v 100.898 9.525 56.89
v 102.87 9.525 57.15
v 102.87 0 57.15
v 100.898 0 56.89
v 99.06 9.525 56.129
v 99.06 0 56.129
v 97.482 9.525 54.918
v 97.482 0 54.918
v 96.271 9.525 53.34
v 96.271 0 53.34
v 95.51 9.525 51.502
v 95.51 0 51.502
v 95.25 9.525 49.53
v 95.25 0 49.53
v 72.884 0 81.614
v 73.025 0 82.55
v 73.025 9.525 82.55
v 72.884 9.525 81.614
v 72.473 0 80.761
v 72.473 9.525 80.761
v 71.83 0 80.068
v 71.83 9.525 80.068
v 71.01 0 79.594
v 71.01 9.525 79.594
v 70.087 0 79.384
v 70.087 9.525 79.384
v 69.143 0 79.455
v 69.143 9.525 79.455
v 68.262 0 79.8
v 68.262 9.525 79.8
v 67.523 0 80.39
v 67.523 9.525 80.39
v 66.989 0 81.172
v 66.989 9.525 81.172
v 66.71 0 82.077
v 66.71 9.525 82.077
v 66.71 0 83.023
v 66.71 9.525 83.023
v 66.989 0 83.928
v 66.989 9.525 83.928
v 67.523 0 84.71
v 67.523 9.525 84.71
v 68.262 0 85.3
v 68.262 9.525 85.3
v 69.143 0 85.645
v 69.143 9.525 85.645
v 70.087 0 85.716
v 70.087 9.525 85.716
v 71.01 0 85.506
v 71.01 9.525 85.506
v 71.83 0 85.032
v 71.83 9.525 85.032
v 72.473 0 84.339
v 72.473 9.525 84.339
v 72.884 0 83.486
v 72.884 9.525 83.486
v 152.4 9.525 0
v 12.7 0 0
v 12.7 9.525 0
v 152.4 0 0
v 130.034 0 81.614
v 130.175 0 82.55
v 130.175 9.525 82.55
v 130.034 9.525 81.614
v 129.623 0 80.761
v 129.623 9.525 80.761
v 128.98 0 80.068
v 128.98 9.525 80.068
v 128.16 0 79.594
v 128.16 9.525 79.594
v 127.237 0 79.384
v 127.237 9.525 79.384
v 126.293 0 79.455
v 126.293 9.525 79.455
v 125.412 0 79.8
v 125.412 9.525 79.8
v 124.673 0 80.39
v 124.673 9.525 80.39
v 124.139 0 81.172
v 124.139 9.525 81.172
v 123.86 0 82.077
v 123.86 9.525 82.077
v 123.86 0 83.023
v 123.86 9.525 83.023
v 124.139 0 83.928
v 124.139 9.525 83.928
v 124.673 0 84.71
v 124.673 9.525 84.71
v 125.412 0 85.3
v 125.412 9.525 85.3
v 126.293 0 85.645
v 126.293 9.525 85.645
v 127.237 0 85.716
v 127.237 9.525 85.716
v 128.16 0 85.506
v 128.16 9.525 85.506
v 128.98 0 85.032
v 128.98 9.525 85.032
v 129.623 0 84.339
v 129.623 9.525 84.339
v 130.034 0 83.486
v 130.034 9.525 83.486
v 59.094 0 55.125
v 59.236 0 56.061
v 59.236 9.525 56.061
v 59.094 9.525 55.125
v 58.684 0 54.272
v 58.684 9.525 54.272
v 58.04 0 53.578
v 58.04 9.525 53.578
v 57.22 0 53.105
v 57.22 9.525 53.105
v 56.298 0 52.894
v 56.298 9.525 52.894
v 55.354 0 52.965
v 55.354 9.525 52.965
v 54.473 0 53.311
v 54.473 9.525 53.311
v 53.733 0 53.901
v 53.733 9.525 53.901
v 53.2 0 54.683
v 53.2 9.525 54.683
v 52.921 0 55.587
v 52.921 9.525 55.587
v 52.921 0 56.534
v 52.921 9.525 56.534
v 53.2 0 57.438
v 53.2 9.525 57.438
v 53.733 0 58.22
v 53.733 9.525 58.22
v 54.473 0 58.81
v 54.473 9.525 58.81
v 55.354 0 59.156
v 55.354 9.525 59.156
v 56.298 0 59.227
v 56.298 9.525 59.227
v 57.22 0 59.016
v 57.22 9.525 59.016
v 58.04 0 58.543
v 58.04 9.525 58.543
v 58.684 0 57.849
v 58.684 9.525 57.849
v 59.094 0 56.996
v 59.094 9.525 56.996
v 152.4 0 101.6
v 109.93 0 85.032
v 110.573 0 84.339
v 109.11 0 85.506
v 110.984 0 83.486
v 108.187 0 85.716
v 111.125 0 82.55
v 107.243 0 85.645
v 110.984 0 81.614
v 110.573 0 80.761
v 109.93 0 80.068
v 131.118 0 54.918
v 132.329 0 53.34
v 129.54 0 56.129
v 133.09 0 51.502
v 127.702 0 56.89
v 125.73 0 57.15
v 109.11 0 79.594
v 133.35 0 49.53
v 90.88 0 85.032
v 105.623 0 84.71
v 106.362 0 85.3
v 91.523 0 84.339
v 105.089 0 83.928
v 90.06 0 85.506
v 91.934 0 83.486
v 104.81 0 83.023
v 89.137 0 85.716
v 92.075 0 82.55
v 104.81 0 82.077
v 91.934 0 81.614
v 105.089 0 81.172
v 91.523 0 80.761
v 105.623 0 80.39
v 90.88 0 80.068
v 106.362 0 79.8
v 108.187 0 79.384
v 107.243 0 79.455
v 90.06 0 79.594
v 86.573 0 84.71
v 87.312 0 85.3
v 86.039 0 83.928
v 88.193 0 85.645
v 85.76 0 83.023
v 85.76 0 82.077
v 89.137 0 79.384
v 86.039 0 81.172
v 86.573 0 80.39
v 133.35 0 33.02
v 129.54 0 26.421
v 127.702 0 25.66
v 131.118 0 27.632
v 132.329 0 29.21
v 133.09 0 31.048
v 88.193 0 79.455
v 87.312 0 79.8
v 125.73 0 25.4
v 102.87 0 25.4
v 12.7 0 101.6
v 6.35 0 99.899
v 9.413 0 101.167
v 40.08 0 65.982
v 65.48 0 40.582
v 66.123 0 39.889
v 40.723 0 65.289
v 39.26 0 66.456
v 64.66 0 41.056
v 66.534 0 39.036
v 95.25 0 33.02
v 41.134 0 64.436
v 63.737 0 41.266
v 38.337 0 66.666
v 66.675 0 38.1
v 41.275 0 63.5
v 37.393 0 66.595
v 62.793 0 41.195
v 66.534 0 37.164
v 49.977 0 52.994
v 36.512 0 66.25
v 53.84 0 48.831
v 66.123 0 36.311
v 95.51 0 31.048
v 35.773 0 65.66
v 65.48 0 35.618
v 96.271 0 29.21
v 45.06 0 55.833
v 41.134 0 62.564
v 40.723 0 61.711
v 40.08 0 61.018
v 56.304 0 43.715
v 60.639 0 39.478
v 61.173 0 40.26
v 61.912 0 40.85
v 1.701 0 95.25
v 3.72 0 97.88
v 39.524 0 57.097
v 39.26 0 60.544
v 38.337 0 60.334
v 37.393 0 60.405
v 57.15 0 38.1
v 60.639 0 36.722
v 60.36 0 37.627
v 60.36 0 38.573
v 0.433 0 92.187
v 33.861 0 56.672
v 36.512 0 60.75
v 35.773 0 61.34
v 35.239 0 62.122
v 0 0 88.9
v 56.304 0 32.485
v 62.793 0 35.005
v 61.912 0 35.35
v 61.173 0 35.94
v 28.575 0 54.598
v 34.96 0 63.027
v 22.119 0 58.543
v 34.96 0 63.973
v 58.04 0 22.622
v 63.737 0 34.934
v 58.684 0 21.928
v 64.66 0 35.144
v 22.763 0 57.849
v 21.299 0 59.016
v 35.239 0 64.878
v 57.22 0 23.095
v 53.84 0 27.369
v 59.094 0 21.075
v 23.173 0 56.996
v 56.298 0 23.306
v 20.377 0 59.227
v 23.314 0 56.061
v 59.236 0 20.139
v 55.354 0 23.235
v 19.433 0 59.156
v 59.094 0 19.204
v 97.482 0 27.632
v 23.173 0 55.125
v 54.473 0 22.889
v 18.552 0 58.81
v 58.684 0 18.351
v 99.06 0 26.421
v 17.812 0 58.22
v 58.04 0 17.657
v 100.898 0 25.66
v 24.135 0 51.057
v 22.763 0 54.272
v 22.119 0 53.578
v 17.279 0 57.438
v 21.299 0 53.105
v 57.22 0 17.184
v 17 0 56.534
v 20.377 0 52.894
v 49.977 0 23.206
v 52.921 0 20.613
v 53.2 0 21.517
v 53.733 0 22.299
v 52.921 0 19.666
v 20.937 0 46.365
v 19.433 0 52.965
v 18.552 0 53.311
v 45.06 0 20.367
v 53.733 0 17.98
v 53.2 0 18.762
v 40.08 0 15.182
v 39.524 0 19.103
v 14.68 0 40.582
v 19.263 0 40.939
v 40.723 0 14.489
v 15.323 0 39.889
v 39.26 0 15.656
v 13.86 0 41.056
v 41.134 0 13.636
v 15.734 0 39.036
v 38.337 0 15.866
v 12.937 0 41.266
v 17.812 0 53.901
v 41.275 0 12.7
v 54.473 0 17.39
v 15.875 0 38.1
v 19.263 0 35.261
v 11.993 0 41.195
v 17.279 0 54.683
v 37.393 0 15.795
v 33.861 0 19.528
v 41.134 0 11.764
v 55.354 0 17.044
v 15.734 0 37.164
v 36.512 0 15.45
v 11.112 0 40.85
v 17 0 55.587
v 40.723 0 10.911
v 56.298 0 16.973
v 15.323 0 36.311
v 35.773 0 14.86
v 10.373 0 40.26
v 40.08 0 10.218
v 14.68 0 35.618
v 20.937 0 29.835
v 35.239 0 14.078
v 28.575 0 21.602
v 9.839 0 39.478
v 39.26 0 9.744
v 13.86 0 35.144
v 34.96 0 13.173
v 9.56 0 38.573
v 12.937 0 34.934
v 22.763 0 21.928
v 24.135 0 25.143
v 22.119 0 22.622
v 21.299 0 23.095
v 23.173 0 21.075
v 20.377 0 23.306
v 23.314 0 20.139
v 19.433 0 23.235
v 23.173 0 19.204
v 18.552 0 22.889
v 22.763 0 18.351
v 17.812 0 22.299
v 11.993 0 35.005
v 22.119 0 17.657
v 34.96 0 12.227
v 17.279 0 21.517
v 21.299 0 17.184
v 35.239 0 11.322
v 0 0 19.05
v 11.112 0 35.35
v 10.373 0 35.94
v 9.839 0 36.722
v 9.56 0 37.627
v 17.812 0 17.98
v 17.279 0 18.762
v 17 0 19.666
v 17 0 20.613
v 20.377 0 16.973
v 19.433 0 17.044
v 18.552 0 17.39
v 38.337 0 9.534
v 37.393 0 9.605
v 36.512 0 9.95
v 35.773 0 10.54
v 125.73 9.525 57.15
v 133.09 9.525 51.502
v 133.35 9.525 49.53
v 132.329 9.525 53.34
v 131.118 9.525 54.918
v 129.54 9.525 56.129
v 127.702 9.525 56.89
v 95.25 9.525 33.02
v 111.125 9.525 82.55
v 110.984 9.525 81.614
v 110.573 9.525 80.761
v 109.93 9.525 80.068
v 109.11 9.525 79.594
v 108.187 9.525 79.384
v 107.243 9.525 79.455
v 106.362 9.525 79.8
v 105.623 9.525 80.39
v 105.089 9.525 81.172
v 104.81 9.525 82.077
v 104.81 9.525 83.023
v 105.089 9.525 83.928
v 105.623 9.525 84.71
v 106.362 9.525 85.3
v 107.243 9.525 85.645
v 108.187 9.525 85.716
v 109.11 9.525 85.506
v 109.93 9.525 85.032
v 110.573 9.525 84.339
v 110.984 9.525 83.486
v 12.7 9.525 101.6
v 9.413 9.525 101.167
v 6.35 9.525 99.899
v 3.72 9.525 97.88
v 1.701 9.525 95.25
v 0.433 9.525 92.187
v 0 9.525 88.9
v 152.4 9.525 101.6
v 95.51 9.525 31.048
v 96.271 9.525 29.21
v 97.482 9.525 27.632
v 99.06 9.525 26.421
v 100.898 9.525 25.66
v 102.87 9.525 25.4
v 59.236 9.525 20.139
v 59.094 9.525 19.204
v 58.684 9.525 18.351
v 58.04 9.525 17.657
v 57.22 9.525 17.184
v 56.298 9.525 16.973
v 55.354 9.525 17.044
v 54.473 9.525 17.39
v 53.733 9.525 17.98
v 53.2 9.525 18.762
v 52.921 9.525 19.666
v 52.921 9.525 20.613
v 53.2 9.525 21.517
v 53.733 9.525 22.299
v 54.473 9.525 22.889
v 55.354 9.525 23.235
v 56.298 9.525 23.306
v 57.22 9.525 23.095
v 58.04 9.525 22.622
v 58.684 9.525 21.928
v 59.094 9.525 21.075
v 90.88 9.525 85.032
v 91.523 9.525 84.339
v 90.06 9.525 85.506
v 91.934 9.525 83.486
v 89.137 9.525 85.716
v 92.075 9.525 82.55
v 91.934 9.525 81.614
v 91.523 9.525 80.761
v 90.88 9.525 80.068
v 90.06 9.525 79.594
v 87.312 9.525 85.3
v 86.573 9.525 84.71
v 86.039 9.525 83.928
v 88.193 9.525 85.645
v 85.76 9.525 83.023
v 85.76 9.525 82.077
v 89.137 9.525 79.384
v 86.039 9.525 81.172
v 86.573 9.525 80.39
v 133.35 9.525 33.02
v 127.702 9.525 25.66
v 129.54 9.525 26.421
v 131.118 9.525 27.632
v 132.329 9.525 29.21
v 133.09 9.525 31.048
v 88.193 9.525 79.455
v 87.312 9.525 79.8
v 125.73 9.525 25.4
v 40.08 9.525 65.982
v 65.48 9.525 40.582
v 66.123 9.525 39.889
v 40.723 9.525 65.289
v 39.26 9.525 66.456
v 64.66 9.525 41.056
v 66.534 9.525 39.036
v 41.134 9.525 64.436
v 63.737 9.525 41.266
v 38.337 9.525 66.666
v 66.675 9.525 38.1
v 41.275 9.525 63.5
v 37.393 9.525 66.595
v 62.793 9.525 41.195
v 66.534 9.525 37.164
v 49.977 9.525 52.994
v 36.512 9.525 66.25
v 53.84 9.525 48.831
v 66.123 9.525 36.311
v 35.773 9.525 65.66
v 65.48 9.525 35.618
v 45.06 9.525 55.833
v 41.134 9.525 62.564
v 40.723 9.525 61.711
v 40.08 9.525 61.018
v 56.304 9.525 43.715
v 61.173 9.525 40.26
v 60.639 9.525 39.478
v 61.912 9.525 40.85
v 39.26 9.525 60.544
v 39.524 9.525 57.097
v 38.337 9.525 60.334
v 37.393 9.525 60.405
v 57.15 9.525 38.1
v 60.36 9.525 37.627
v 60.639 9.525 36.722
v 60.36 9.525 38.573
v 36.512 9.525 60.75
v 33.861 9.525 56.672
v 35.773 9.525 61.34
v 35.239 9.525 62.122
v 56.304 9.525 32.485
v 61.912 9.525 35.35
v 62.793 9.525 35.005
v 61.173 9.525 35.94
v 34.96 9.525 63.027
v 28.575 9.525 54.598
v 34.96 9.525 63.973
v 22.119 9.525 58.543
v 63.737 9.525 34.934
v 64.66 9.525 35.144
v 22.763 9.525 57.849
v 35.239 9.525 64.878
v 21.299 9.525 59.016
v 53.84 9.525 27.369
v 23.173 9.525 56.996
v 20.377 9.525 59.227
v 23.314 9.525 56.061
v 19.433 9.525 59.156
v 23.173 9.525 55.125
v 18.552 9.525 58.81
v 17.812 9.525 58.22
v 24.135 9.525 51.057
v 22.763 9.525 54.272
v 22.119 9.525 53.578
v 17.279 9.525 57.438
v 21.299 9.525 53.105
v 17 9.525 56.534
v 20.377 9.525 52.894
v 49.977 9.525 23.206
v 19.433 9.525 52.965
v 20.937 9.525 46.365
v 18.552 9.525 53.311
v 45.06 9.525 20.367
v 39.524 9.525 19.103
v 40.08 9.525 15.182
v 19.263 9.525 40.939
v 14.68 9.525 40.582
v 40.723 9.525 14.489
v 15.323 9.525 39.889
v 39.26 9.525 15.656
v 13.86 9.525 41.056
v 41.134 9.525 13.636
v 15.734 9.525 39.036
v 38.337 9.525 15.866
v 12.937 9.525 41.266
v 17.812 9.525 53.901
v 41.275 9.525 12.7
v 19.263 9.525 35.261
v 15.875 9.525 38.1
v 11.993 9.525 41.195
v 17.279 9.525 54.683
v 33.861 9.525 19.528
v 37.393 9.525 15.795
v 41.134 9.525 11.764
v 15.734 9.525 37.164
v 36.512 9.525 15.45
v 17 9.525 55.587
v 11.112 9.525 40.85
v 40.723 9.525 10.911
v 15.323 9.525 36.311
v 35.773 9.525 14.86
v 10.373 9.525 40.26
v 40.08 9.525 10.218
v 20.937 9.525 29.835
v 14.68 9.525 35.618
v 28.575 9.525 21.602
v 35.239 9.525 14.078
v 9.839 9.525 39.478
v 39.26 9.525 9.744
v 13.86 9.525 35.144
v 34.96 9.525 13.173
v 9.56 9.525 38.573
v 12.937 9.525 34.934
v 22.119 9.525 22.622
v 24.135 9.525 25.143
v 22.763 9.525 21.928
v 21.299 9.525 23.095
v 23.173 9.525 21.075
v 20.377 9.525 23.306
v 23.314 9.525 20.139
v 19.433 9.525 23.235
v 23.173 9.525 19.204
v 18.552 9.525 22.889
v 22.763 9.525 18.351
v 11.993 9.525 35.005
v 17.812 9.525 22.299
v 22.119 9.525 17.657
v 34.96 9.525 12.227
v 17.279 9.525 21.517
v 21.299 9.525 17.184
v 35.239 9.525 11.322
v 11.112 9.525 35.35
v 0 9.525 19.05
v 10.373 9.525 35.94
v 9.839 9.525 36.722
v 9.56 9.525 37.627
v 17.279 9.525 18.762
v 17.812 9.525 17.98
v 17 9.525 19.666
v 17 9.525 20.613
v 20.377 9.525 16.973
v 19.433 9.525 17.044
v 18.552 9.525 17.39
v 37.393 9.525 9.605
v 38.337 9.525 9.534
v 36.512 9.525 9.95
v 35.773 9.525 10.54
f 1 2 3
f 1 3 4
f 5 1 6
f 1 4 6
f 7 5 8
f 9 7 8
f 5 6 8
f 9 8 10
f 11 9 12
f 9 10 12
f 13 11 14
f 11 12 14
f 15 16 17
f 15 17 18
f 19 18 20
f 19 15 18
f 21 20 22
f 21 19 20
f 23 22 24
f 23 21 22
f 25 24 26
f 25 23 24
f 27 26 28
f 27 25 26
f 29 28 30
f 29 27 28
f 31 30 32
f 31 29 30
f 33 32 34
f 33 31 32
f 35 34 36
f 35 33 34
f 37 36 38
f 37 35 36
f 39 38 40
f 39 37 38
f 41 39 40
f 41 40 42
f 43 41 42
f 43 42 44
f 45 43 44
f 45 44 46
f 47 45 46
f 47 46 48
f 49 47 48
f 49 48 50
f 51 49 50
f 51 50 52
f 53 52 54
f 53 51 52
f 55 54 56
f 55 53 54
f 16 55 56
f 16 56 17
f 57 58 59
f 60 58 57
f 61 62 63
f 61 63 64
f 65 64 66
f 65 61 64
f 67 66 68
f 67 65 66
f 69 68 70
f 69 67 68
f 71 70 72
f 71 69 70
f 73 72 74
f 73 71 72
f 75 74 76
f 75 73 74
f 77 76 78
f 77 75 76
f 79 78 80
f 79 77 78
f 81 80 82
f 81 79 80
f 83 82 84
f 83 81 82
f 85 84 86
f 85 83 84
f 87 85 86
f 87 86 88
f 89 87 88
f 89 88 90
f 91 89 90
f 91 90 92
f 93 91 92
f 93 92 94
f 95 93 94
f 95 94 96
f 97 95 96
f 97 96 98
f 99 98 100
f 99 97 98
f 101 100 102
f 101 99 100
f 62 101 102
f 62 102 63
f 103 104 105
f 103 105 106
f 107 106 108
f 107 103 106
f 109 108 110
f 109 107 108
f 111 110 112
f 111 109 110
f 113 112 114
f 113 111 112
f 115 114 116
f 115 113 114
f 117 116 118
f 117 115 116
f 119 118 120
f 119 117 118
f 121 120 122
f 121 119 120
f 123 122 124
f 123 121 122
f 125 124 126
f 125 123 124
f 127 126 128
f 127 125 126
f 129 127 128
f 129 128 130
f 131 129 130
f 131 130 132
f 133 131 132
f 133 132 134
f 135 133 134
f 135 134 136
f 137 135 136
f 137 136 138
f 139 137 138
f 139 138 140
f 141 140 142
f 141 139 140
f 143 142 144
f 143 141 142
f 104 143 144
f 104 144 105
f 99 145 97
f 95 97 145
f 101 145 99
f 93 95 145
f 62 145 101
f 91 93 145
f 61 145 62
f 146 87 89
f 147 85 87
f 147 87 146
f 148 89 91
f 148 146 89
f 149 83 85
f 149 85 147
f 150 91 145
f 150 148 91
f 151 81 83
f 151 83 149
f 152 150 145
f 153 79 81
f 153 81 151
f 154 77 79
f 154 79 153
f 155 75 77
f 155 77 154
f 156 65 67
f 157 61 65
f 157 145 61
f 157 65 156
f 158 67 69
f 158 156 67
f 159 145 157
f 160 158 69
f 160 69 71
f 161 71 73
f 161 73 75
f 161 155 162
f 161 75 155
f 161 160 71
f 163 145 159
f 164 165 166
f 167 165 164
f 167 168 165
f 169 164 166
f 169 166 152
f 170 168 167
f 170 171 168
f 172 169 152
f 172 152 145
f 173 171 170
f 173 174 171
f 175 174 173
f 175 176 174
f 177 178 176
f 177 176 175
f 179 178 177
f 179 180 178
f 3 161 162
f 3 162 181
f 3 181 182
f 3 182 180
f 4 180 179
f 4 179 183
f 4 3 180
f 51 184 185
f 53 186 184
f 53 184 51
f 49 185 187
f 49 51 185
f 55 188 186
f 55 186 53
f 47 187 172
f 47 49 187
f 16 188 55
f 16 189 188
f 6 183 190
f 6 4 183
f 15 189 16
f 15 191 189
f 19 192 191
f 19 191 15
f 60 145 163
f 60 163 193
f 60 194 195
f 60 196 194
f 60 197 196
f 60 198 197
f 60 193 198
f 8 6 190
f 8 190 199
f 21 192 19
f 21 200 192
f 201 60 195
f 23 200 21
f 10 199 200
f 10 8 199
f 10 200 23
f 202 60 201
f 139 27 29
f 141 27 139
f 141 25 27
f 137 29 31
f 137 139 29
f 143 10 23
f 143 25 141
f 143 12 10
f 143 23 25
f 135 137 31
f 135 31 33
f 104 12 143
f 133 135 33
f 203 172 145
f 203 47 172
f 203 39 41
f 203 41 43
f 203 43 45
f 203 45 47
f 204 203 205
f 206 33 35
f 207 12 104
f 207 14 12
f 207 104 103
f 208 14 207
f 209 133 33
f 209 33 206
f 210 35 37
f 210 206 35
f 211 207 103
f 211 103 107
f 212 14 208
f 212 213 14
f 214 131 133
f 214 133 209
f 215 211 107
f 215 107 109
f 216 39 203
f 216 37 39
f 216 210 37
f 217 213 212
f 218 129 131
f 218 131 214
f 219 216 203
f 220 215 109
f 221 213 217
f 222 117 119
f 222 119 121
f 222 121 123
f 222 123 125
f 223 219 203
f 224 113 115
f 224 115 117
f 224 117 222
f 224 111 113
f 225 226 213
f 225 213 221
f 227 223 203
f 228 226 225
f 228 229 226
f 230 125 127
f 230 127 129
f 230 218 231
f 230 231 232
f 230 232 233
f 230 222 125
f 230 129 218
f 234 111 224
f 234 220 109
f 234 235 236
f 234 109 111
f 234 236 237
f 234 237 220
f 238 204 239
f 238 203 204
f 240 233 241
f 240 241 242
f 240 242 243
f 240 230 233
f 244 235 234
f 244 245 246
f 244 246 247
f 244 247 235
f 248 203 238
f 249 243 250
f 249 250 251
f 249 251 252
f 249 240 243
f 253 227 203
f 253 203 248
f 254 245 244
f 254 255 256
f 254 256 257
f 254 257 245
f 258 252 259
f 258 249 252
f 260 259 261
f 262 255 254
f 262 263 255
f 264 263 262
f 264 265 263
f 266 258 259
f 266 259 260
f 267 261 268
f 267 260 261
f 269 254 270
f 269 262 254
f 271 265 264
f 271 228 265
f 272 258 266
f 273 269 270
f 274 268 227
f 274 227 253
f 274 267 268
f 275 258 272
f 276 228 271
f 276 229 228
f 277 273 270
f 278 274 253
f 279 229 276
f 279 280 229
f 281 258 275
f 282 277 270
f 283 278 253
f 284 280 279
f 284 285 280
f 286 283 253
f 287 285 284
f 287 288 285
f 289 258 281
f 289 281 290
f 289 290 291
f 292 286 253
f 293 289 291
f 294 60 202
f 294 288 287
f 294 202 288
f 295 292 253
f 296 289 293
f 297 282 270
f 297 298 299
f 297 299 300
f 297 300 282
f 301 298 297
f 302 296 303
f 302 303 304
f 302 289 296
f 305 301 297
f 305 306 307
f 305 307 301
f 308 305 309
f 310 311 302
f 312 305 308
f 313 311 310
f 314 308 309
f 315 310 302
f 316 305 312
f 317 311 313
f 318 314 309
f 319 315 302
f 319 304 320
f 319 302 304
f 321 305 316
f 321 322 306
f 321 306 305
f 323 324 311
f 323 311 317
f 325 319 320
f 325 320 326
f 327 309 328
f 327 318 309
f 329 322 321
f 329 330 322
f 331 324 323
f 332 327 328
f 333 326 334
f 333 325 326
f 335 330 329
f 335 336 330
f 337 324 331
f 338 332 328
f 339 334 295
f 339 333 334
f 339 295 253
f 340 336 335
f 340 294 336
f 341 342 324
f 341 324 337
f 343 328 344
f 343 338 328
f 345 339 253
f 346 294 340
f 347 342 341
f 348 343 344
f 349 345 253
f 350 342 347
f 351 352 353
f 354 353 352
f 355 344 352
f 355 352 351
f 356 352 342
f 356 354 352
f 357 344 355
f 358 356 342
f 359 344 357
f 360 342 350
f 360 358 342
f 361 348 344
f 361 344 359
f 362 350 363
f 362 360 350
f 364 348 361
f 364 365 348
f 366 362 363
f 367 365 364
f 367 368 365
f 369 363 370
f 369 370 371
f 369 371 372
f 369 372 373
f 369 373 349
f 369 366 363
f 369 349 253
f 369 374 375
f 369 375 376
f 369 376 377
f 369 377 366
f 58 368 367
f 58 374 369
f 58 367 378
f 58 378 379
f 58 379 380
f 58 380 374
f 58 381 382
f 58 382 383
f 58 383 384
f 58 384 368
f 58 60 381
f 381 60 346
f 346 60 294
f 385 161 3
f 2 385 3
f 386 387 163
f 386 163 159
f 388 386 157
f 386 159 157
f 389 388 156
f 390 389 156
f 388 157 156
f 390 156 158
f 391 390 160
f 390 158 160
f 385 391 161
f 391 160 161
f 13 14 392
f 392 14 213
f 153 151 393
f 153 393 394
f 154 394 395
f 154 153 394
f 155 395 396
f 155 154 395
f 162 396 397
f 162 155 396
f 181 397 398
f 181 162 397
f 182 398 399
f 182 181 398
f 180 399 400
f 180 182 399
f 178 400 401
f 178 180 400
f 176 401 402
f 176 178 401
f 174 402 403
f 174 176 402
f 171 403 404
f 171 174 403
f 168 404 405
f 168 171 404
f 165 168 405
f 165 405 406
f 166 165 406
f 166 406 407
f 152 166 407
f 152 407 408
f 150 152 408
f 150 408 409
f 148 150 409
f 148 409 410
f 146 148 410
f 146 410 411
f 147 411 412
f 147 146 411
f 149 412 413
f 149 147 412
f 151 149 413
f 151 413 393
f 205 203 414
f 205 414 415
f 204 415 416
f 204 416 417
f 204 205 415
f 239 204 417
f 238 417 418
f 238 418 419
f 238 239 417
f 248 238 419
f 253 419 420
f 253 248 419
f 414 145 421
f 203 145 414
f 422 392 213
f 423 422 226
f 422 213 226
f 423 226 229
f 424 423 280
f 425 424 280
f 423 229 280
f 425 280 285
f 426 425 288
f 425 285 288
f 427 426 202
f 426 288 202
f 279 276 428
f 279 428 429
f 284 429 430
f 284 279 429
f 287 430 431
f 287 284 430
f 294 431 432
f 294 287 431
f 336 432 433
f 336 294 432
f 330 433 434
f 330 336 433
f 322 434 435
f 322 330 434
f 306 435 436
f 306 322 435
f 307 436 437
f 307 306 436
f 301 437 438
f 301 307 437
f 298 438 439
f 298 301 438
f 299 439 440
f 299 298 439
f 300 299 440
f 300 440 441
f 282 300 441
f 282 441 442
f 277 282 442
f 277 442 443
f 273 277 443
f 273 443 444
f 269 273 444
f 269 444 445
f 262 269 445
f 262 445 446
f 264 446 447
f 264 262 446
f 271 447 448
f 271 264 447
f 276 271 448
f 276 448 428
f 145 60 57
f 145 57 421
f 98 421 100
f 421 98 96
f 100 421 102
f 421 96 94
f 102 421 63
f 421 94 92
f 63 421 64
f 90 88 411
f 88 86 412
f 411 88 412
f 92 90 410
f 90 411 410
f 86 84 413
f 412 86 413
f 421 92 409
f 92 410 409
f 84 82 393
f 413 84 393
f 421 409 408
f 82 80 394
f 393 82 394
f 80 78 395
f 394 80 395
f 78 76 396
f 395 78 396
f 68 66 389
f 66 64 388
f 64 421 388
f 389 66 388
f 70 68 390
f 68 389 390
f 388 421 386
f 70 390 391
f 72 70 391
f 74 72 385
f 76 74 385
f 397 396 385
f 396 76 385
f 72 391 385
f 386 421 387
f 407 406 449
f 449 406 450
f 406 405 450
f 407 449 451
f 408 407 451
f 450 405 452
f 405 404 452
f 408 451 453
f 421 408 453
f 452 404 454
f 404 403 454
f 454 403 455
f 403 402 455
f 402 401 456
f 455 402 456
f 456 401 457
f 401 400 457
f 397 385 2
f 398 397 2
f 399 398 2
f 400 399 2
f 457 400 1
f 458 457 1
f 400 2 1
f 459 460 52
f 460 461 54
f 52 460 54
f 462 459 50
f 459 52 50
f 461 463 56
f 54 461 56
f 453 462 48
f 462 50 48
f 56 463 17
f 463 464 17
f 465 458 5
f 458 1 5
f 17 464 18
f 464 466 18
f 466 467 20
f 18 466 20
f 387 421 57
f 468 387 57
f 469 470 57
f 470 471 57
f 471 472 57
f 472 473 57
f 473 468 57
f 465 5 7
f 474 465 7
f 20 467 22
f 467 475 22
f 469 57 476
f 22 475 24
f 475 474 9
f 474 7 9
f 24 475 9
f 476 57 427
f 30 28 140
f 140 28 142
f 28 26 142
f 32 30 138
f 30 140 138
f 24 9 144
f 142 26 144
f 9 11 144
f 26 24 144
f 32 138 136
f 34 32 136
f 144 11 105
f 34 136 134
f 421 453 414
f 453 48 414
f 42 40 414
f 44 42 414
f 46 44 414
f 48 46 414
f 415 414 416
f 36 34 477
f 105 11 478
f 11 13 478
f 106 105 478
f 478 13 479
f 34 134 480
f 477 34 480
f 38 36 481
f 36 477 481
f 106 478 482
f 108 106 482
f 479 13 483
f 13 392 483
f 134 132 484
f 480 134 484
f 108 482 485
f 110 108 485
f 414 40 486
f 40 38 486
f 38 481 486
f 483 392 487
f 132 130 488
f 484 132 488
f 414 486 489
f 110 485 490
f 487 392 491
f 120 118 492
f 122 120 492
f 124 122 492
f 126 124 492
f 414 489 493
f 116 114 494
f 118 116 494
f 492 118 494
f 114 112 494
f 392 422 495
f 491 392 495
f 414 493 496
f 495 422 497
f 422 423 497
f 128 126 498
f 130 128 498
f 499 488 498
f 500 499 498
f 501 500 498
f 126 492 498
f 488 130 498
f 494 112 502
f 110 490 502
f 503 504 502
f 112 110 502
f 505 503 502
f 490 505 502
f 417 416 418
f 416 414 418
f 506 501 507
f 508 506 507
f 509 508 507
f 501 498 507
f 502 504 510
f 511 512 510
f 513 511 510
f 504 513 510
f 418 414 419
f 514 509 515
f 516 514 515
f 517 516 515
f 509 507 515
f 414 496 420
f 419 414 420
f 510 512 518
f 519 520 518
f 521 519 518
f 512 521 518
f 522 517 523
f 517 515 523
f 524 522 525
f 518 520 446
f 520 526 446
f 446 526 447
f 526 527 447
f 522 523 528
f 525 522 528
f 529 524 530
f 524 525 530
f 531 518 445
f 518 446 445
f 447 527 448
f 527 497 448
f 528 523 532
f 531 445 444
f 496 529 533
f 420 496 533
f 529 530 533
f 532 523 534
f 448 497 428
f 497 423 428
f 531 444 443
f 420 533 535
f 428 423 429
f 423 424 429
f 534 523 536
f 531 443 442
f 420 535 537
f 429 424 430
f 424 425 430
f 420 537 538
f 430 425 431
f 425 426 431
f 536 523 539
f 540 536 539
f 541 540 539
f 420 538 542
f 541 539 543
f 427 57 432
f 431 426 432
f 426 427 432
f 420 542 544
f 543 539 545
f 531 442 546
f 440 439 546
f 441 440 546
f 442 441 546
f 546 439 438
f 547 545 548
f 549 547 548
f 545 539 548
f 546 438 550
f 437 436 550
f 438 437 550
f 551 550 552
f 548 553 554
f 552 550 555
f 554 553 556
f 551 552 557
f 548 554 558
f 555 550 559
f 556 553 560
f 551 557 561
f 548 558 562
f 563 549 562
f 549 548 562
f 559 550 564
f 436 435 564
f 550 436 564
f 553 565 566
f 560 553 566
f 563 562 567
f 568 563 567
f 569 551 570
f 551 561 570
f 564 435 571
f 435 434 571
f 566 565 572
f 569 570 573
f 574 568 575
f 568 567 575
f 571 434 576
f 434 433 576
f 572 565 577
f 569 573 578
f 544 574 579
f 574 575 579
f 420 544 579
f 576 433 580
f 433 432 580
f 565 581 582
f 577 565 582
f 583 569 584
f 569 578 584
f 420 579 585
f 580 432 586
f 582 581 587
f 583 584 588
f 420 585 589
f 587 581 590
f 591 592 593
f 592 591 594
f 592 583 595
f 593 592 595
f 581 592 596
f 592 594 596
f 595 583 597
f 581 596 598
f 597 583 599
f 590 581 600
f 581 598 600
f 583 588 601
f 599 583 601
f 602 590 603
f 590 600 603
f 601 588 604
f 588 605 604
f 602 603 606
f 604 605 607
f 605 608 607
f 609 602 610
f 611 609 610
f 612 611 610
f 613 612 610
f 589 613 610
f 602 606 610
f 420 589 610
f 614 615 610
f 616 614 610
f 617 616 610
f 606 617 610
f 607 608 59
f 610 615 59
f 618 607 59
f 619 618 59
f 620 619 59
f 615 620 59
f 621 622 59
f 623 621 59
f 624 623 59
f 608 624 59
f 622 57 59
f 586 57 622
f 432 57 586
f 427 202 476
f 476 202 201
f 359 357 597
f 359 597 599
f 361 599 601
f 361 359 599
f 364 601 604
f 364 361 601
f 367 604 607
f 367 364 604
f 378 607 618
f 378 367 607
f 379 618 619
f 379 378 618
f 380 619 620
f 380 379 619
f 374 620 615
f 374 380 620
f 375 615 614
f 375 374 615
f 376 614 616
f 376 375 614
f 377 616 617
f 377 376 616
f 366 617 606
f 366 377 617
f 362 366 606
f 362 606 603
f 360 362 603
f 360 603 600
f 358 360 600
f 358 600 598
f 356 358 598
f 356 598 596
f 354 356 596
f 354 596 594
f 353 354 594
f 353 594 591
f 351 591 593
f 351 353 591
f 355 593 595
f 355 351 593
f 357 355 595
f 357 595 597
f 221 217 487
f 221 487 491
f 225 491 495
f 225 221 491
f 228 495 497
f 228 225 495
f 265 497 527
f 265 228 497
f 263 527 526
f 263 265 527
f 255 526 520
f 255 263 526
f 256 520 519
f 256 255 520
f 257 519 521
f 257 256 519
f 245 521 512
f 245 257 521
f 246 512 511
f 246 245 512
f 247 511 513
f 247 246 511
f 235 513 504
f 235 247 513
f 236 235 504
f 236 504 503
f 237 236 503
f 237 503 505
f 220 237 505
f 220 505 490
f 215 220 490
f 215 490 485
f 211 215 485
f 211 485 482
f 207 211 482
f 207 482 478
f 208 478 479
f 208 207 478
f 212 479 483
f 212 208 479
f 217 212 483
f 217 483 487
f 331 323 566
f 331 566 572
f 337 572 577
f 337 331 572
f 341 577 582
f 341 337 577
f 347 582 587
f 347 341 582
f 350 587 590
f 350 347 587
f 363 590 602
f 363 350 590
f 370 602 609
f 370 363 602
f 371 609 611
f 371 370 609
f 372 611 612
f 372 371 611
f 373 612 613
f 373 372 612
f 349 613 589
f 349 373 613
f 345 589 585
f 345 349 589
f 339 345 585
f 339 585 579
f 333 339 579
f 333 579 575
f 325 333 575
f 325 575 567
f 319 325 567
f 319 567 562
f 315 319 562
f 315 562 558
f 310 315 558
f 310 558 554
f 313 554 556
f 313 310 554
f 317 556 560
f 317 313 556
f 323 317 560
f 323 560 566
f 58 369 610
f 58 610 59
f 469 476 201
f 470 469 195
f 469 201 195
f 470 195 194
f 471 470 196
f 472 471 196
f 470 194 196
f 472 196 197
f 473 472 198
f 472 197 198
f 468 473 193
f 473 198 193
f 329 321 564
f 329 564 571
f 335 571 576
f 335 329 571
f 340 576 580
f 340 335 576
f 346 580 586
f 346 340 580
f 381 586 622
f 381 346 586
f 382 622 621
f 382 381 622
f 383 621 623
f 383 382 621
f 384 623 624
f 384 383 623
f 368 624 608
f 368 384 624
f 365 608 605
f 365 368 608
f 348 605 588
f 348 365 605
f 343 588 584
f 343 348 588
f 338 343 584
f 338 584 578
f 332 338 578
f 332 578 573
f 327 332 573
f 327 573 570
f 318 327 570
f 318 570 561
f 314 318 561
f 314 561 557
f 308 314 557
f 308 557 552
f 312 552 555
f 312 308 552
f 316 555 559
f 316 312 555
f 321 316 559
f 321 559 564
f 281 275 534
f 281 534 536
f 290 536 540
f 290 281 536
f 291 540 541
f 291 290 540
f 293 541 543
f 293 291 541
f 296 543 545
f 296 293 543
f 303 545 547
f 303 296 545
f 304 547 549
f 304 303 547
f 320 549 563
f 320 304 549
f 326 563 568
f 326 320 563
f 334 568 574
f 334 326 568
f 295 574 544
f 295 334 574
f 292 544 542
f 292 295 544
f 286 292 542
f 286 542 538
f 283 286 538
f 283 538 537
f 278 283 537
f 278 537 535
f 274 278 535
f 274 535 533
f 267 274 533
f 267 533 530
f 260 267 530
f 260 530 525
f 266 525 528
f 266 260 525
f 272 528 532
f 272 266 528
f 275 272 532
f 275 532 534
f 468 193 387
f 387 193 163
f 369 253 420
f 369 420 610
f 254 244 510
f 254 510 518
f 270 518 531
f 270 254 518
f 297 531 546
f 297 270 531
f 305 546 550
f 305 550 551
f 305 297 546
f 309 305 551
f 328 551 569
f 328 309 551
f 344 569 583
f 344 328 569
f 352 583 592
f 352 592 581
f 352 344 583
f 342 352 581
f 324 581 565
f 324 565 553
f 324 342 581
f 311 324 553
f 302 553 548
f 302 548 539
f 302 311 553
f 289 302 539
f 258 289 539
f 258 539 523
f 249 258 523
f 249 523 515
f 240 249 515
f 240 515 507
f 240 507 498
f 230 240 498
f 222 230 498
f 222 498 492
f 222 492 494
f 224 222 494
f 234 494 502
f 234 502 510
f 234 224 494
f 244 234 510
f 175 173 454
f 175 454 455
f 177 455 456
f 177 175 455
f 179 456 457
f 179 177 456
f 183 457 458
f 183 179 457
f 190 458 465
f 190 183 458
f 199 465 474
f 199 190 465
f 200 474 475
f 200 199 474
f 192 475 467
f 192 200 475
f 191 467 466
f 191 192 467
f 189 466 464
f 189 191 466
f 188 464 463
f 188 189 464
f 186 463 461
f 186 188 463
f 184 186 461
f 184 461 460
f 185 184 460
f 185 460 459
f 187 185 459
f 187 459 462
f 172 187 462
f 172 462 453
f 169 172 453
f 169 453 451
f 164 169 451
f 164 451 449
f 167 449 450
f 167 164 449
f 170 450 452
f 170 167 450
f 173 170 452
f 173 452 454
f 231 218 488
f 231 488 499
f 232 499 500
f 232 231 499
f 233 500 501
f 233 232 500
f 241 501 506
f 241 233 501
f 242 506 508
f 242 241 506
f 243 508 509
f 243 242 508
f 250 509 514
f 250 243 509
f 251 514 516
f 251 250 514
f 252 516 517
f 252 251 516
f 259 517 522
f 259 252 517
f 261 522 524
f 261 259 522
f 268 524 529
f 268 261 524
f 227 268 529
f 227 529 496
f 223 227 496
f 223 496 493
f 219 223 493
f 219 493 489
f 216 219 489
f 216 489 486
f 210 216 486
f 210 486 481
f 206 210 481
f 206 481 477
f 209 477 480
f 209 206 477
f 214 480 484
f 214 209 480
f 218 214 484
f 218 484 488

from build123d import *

# Parameters (mm, degrees)
SKETCH1_R           = 19.05
SKETCH1_R_2         = 3.175
BOSS_EXTRUDE1_DEPTH = 9.525


with BuildPart() as part:
    # Sketch1 → Boss-Extrude1 (new body)
    with BuildSketch(Plane(origin=(0, 0, 0), x_dir=(1, 0, 0), z_dir=(0, 1, 0))):
        with BuildLine():
            Line((0, -19.05), (12.7, 0))
            Line((12.7, 0), (152.4, 0))
            Line((152.4, 0), (152.4, -101.6))
            Line((152.4, -101.6), (12.7, -101.6))
            ThreePointArc((12.7, -101.6), (3.719743879, -97.880256121), (0, -88.9))
            Line((0, -88.9), (0, -19.05))
        make_face()
        with Locations((38.1, -38.1)):
            Circle(SKETCH1_R, mode=Mode.SUBTRACT)
        with Locations((56.060512242, -56.060512242)):
            Circle(SKETCH1_R_2, mode=Mode.SUBTRACT)
        with Locations((38.1, -63.5)):
            Circle(SKETCH1_R_2, mode=Mode.SUBTRACT)
        with Locations((20.139487758, -56.060512242)):
            Circle(SKETCH1_R_2, mode=Mode.SUBTRACT)
        with Locations((12.7, -38.1)):
            Circle(SKETCH1_R_2, mode=Mode.SUBTRACT)
        with Locations((20.139487758, -20.139487758)):
            Circle(SKETCH1_R_2, mode=Mode.SUBTRACT)
        with Locations((38.1, -12.7)):
            Circle(SKETCH1_R_2, mode=Mode.SUBTRACT)
        with Locations((56.060512242, -20.139487758)):
            Circle(SKETCH1_R_2, mode=Mode.SUBTRACT)
        with Locations((63.5, -38.1)):
            Circle(SKETCH1_R_2, mode=Mode.SUBTRACT)
        with Locations((69.85, -82.55)):
            Circle(SKETCH1_R_2, mode=Mode.SUBTRACT)
        with Locations((88.9, -82.55)):
            Circle(SKETCH1_R_2, mode=Mode.SUBTRACT)
        with Locations((107.95, -82.55)):
            Circle(SKETCH1_R_2, mode=Mode.SUBTRACT)
        with Locations((127, -82.55)):
            Circle(SKETCH1_R_2, mode=Mode.SUBTRACT)
        with BuildLine():
            Line((102.87, -25.4), (125.73, -25.4))
            ThreePointArc((125.73, -25.4), (131.118153673, -27.631846327), (133.35, -33.02))
            Line((133.35, -33.02), (133.35, -49.53))
            ThreePointArc((133.35, -49.53), (131.118153673, -54.918153673), (125.73, -57.15))
            Line((125.73, -57.15), (102.87, -57.15))
            ThreePointArc((102.87, -57.15), (97.481846327, -54.918153673), (95.25, -49.53))
            Line((95.25, -49.53), (95.25, -33.02))
            ThreePointArc((95.25, -33.02), (97.481846327, -27.631846327), (102.87, -25.4))
        make_face(mode=Mode.SUBTRACT)
    extrude(amount=BOSS_EXTRUDE1_DEPTH)


solid = part.part
